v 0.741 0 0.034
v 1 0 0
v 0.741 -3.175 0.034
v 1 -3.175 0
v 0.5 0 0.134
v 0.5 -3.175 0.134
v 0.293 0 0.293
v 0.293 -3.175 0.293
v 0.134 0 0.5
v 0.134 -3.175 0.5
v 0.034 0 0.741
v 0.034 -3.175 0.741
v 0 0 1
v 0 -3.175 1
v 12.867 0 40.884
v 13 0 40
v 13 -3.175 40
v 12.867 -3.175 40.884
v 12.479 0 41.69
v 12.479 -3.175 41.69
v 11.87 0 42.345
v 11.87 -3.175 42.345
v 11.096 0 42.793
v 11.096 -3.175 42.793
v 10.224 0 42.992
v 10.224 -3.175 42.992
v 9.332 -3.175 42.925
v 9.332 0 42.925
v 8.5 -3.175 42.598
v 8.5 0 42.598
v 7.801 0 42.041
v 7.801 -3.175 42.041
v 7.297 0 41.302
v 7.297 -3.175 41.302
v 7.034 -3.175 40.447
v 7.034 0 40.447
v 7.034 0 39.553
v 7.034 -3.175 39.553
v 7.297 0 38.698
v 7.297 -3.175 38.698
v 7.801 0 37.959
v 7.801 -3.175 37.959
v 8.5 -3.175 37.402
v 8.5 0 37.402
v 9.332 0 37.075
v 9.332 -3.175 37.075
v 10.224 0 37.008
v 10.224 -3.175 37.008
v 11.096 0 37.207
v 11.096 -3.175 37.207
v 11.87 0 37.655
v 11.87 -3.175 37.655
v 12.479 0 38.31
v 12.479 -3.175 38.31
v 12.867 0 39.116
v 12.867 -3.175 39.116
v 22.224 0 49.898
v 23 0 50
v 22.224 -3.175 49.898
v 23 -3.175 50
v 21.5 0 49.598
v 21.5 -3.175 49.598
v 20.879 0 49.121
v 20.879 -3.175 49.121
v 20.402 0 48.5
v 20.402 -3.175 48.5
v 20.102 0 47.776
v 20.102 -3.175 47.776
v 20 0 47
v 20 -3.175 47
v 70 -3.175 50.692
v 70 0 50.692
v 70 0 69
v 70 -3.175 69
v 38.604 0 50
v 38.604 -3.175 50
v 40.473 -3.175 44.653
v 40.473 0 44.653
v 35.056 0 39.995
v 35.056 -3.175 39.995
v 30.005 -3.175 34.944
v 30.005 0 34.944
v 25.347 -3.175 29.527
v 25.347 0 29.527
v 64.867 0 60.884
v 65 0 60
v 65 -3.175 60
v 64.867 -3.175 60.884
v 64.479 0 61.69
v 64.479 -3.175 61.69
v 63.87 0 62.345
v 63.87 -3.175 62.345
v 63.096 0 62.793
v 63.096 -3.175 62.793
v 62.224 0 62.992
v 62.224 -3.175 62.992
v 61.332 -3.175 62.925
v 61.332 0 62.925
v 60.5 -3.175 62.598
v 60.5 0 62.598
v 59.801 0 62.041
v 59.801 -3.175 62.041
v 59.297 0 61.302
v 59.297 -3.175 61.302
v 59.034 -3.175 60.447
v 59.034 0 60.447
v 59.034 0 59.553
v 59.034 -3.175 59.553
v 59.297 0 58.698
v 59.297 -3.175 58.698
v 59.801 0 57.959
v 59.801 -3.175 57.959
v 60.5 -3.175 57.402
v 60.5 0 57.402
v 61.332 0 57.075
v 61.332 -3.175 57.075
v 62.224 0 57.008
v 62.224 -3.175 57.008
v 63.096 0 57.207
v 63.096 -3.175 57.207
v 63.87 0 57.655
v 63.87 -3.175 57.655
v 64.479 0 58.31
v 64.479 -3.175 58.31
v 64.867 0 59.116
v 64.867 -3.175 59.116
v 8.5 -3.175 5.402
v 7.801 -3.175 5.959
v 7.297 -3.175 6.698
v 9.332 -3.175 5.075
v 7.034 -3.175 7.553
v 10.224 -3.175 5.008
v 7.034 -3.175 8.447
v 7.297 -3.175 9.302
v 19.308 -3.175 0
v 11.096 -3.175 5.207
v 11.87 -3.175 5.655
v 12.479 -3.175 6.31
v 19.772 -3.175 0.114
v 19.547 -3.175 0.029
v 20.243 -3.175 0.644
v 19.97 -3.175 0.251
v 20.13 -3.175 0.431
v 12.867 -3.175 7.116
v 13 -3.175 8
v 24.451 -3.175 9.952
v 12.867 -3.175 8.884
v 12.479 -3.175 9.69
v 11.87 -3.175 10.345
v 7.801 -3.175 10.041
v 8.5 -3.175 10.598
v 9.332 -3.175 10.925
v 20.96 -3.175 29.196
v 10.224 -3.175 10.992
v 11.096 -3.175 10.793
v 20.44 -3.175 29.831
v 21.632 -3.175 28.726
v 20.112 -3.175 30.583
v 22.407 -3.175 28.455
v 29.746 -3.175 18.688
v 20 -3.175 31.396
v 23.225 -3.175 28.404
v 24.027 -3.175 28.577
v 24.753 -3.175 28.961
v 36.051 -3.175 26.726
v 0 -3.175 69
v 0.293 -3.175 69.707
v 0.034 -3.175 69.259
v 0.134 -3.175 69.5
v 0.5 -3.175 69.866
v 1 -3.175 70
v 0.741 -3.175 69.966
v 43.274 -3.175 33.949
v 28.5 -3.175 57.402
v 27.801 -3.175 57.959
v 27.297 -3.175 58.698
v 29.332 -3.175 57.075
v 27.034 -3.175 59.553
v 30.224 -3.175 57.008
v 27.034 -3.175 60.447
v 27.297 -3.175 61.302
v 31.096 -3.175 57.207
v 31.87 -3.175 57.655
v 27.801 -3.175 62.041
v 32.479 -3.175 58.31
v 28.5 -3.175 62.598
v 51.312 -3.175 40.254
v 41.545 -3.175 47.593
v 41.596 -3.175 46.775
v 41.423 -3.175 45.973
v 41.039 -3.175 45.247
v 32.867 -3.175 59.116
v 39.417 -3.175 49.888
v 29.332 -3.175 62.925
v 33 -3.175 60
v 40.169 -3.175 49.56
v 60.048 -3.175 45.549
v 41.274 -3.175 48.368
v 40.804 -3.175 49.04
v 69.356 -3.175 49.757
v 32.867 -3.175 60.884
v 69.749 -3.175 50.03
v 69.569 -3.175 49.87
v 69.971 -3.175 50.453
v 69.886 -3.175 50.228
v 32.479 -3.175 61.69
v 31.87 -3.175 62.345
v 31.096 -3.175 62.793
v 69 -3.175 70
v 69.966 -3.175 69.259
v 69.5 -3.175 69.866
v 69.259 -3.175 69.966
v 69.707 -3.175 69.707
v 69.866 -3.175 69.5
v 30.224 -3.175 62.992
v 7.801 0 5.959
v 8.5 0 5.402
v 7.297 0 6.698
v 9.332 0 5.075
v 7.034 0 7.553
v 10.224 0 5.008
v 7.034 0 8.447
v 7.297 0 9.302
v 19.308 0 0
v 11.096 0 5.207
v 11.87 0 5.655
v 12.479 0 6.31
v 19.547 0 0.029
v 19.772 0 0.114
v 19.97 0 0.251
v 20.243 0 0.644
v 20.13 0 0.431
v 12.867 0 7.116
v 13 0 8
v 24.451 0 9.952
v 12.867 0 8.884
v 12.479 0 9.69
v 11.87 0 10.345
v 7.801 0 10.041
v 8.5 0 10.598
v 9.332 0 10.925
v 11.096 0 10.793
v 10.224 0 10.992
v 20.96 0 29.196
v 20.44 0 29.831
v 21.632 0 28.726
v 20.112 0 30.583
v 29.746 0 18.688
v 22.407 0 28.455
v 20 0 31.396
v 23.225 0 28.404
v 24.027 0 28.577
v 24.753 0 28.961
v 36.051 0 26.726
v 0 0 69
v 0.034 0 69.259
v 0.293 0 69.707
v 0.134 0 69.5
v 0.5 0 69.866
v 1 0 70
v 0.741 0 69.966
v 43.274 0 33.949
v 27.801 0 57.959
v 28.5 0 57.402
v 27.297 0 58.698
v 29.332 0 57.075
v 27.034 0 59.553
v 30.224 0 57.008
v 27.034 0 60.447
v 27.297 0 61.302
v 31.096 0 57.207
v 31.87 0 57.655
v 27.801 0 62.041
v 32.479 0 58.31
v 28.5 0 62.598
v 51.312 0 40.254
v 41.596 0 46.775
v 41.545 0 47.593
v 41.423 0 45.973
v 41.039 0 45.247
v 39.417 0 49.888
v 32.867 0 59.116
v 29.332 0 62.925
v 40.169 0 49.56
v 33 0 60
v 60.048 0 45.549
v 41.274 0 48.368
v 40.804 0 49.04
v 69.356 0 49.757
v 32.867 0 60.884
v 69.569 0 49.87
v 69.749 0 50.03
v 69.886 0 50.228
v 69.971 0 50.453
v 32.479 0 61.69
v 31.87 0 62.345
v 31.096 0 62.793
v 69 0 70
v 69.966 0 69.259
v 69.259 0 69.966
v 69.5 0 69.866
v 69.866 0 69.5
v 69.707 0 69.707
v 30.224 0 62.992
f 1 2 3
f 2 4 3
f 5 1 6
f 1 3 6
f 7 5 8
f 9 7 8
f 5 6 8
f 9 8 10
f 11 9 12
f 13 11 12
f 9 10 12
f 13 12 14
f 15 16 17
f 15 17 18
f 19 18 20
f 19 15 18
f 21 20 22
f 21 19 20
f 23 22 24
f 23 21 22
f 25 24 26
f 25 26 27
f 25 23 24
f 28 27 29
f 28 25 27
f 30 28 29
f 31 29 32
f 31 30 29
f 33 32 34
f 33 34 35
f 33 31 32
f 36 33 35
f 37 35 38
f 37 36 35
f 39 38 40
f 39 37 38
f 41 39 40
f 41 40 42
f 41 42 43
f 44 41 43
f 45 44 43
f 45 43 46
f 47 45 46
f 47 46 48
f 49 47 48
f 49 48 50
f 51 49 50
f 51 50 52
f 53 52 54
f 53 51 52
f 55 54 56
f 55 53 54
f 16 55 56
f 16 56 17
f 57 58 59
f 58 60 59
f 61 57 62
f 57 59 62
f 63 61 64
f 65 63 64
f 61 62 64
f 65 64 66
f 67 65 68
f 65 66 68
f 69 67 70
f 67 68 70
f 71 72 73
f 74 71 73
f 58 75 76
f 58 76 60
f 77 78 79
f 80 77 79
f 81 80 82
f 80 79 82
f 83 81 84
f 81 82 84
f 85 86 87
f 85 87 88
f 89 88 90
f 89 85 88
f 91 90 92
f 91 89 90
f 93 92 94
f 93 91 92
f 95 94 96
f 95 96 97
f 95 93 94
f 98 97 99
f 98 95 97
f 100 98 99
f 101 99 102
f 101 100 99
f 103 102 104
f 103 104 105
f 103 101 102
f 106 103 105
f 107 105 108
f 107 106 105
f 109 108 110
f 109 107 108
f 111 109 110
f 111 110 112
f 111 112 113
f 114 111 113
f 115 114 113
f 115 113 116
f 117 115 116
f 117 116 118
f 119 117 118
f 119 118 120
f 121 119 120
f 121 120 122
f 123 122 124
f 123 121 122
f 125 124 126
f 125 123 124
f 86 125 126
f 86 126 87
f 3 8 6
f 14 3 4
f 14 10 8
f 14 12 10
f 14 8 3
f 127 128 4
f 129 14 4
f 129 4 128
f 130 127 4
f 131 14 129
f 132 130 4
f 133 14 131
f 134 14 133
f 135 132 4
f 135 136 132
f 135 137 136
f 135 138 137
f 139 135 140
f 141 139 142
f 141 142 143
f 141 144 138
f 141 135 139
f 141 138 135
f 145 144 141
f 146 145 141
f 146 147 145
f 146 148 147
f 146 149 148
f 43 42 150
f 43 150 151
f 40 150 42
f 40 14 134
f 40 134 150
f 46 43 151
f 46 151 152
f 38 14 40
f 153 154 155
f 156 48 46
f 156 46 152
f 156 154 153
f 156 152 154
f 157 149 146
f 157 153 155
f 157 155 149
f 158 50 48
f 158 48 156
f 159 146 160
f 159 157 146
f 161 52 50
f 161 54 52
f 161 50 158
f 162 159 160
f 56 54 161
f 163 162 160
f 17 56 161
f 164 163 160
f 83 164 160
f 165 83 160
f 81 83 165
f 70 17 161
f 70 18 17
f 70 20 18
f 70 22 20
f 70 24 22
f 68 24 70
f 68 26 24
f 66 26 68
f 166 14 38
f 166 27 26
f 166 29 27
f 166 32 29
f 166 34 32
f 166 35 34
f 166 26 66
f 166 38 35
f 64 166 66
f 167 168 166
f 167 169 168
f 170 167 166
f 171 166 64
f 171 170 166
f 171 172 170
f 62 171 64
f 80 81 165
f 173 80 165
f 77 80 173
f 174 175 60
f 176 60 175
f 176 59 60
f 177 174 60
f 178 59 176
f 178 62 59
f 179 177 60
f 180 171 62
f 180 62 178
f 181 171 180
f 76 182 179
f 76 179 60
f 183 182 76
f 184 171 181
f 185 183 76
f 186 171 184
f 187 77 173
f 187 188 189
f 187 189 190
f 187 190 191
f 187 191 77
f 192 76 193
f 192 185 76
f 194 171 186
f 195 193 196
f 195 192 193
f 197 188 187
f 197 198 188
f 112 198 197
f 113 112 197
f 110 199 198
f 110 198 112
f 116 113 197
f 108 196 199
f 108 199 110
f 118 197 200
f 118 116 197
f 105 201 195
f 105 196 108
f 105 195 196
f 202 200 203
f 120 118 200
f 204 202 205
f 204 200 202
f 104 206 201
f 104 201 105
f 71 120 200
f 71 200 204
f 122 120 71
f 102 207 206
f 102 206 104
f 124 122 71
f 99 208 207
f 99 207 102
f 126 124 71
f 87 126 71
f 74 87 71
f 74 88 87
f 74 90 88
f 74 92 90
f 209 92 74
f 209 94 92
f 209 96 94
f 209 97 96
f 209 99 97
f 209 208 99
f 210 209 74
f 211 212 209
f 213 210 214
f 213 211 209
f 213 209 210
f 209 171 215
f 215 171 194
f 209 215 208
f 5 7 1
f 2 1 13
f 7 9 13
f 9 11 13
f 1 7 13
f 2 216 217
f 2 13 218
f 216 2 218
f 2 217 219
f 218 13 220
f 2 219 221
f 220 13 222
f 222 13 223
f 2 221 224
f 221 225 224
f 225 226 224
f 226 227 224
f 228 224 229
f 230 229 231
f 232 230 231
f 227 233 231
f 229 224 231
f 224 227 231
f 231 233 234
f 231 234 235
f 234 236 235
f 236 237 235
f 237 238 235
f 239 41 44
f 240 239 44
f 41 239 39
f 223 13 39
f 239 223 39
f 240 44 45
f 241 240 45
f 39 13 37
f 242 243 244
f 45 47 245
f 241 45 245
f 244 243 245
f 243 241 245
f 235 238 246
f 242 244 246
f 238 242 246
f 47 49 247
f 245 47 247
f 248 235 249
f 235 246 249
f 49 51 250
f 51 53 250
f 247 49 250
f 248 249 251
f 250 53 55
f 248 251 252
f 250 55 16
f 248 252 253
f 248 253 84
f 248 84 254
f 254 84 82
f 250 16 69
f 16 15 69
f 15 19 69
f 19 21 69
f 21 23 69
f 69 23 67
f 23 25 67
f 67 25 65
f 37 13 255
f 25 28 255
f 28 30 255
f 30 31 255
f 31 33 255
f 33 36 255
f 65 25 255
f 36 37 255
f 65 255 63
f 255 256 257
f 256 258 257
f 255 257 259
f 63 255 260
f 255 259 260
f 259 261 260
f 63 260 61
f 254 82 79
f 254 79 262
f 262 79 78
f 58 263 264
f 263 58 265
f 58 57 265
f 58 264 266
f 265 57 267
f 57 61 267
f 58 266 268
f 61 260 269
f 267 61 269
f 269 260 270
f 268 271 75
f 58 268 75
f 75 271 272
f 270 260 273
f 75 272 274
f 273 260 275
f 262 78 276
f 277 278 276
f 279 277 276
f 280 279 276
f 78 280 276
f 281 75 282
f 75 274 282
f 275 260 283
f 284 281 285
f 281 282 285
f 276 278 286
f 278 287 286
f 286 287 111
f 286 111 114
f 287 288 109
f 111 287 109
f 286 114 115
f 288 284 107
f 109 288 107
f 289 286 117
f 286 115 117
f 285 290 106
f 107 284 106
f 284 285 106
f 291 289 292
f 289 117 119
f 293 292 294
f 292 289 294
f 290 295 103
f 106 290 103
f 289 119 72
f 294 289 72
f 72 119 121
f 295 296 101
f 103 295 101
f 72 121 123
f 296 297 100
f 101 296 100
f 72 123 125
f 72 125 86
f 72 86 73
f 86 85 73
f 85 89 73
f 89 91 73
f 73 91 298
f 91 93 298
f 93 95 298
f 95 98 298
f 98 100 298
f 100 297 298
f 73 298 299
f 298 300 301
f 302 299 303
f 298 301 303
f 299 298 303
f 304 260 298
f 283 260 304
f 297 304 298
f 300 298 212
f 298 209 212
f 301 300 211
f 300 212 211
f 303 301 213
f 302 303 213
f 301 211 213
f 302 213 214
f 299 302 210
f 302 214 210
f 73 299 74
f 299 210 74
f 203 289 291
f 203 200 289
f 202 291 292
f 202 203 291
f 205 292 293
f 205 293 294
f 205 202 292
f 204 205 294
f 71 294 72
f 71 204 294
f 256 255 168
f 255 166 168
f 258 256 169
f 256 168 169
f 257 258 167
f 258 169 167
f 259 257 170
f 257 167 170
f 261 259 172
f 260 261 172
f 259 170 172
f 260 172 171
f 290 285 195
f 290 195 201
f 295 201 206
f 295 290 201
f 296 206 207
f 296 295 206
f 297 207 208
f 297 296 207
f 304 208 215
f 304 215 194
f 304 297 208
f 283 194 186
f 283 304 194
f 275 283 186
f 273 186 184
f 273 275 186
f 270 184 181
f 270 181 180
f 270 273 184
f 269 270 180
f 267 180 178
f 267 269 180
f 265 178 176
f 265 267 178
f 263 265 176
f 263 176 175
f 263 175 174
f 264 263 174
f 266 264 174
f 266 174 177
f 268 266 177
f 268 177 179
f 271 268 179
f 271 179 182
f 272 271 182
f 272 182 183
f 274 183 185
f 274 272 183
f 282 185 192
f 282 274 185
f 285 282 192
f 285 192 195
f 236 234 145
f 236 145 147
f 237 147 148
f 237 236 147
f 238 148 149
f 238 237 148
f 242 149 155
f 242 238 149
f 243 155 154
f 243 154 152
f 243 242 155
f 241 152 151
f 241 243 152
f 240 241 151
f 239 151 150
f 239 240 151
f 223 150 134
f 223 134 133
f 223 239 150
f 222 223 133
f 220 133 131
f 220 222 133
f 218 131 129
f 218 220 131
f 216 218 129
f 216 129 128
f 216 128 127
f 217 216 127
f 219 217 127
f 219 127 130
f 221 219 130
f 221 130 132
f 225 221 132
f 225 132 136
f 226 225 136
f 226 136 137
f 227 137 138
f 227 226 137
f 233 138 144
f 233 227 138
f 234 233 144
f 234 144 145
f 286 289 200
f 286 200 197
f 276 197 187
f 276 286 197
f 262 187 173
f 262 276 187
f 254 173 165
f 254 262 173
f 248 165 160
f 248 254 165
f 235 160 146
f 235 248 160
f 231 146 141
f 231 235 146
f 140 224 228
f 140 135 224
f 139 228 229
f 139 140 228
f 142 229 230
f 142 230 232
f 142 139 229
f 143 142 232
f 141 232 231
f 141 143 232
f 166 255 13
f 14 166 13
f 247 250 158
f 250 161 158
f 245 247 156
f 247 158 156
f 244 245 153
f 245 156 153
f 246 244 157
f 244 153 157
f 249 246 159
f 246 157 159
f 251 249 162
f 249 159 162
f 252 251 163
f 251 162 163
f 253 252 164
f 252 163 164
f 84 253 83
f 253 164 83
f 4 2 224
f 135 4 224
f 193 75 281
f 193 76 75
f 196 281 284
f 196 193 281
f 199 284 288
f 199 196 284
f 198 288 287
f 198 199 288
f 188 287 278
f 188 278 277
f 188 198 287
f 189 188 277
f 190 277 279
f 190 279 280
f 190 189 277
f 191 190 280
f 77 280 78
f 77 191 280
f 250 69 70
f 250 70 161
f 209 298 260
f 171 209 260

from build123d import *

# Parameters (mm, degrees)
SKETCH_R    = 3
PAD_DEPTH   = 3.175
FILLET_R    = 3
FILLET001_R = 1


with BuildPart() as part:
    # Sketch → Pad (new body)
    with BuildSketch(Plane.XZ):
        with BuildLine():
            Line((0, 0), (20, 0))
            ThreePointArc((70, 50), (39.553951, 30.446049), (20, 0))
            Line((70, 50), (70, 70))
            Line((70, 70), (0, 70))
            Line((0, 70), (0, 0))
        make_face()
        with Locations((10, 40)):
            Circle(SKETCH_R, mode=Mode.SUBTRACT)
        with Locations((10, 8)):
            Circle(SKETCH_R, mode=Mode.SUBTRACT)
        with Locations((30, 60)):
            Circle(SKETCH_R, mode=Mode.SUBTRACT)
        with Locations((62, 60)):
            Circle(SKETCH_R, mode=Mode.SUBTRACT)
        with BuildLine():
            Line((47.893188, 50), (20, 50))
            Line((20, 50), (20, 22.106812))
            ThreePointArc((47.893188, 50), (32.482884, 37.517116), (20, 22.106812))
        make_face(mode=Mode.SUBTRACT)
    extrude(amount=PAD_DEPTH)

    # Fillet
    fillet_edges = [part.edges().sort_by_distance(p)[0] for p in [
        (20, -1.5875, 22.106812),
        (47.893188, -1.5875, 50),
        (20, -1.5875, 50),
    ]]
    fillet(fillet_edges, radius=FILLET_R)

    # Fillet001
    fillet001_edges = [part.edges().sort_by_distance(p)[0] for p in [
        (70, -1.5875, 50),
        (70, -1.5875, 70),
        (20, -1.5875, 0),
        (0, -1.5875, 0),
        (0, -1.5875, 70),
    ]]
    fillet(fillet001_edges, radius=FILLET001_R)


solid = part.part
